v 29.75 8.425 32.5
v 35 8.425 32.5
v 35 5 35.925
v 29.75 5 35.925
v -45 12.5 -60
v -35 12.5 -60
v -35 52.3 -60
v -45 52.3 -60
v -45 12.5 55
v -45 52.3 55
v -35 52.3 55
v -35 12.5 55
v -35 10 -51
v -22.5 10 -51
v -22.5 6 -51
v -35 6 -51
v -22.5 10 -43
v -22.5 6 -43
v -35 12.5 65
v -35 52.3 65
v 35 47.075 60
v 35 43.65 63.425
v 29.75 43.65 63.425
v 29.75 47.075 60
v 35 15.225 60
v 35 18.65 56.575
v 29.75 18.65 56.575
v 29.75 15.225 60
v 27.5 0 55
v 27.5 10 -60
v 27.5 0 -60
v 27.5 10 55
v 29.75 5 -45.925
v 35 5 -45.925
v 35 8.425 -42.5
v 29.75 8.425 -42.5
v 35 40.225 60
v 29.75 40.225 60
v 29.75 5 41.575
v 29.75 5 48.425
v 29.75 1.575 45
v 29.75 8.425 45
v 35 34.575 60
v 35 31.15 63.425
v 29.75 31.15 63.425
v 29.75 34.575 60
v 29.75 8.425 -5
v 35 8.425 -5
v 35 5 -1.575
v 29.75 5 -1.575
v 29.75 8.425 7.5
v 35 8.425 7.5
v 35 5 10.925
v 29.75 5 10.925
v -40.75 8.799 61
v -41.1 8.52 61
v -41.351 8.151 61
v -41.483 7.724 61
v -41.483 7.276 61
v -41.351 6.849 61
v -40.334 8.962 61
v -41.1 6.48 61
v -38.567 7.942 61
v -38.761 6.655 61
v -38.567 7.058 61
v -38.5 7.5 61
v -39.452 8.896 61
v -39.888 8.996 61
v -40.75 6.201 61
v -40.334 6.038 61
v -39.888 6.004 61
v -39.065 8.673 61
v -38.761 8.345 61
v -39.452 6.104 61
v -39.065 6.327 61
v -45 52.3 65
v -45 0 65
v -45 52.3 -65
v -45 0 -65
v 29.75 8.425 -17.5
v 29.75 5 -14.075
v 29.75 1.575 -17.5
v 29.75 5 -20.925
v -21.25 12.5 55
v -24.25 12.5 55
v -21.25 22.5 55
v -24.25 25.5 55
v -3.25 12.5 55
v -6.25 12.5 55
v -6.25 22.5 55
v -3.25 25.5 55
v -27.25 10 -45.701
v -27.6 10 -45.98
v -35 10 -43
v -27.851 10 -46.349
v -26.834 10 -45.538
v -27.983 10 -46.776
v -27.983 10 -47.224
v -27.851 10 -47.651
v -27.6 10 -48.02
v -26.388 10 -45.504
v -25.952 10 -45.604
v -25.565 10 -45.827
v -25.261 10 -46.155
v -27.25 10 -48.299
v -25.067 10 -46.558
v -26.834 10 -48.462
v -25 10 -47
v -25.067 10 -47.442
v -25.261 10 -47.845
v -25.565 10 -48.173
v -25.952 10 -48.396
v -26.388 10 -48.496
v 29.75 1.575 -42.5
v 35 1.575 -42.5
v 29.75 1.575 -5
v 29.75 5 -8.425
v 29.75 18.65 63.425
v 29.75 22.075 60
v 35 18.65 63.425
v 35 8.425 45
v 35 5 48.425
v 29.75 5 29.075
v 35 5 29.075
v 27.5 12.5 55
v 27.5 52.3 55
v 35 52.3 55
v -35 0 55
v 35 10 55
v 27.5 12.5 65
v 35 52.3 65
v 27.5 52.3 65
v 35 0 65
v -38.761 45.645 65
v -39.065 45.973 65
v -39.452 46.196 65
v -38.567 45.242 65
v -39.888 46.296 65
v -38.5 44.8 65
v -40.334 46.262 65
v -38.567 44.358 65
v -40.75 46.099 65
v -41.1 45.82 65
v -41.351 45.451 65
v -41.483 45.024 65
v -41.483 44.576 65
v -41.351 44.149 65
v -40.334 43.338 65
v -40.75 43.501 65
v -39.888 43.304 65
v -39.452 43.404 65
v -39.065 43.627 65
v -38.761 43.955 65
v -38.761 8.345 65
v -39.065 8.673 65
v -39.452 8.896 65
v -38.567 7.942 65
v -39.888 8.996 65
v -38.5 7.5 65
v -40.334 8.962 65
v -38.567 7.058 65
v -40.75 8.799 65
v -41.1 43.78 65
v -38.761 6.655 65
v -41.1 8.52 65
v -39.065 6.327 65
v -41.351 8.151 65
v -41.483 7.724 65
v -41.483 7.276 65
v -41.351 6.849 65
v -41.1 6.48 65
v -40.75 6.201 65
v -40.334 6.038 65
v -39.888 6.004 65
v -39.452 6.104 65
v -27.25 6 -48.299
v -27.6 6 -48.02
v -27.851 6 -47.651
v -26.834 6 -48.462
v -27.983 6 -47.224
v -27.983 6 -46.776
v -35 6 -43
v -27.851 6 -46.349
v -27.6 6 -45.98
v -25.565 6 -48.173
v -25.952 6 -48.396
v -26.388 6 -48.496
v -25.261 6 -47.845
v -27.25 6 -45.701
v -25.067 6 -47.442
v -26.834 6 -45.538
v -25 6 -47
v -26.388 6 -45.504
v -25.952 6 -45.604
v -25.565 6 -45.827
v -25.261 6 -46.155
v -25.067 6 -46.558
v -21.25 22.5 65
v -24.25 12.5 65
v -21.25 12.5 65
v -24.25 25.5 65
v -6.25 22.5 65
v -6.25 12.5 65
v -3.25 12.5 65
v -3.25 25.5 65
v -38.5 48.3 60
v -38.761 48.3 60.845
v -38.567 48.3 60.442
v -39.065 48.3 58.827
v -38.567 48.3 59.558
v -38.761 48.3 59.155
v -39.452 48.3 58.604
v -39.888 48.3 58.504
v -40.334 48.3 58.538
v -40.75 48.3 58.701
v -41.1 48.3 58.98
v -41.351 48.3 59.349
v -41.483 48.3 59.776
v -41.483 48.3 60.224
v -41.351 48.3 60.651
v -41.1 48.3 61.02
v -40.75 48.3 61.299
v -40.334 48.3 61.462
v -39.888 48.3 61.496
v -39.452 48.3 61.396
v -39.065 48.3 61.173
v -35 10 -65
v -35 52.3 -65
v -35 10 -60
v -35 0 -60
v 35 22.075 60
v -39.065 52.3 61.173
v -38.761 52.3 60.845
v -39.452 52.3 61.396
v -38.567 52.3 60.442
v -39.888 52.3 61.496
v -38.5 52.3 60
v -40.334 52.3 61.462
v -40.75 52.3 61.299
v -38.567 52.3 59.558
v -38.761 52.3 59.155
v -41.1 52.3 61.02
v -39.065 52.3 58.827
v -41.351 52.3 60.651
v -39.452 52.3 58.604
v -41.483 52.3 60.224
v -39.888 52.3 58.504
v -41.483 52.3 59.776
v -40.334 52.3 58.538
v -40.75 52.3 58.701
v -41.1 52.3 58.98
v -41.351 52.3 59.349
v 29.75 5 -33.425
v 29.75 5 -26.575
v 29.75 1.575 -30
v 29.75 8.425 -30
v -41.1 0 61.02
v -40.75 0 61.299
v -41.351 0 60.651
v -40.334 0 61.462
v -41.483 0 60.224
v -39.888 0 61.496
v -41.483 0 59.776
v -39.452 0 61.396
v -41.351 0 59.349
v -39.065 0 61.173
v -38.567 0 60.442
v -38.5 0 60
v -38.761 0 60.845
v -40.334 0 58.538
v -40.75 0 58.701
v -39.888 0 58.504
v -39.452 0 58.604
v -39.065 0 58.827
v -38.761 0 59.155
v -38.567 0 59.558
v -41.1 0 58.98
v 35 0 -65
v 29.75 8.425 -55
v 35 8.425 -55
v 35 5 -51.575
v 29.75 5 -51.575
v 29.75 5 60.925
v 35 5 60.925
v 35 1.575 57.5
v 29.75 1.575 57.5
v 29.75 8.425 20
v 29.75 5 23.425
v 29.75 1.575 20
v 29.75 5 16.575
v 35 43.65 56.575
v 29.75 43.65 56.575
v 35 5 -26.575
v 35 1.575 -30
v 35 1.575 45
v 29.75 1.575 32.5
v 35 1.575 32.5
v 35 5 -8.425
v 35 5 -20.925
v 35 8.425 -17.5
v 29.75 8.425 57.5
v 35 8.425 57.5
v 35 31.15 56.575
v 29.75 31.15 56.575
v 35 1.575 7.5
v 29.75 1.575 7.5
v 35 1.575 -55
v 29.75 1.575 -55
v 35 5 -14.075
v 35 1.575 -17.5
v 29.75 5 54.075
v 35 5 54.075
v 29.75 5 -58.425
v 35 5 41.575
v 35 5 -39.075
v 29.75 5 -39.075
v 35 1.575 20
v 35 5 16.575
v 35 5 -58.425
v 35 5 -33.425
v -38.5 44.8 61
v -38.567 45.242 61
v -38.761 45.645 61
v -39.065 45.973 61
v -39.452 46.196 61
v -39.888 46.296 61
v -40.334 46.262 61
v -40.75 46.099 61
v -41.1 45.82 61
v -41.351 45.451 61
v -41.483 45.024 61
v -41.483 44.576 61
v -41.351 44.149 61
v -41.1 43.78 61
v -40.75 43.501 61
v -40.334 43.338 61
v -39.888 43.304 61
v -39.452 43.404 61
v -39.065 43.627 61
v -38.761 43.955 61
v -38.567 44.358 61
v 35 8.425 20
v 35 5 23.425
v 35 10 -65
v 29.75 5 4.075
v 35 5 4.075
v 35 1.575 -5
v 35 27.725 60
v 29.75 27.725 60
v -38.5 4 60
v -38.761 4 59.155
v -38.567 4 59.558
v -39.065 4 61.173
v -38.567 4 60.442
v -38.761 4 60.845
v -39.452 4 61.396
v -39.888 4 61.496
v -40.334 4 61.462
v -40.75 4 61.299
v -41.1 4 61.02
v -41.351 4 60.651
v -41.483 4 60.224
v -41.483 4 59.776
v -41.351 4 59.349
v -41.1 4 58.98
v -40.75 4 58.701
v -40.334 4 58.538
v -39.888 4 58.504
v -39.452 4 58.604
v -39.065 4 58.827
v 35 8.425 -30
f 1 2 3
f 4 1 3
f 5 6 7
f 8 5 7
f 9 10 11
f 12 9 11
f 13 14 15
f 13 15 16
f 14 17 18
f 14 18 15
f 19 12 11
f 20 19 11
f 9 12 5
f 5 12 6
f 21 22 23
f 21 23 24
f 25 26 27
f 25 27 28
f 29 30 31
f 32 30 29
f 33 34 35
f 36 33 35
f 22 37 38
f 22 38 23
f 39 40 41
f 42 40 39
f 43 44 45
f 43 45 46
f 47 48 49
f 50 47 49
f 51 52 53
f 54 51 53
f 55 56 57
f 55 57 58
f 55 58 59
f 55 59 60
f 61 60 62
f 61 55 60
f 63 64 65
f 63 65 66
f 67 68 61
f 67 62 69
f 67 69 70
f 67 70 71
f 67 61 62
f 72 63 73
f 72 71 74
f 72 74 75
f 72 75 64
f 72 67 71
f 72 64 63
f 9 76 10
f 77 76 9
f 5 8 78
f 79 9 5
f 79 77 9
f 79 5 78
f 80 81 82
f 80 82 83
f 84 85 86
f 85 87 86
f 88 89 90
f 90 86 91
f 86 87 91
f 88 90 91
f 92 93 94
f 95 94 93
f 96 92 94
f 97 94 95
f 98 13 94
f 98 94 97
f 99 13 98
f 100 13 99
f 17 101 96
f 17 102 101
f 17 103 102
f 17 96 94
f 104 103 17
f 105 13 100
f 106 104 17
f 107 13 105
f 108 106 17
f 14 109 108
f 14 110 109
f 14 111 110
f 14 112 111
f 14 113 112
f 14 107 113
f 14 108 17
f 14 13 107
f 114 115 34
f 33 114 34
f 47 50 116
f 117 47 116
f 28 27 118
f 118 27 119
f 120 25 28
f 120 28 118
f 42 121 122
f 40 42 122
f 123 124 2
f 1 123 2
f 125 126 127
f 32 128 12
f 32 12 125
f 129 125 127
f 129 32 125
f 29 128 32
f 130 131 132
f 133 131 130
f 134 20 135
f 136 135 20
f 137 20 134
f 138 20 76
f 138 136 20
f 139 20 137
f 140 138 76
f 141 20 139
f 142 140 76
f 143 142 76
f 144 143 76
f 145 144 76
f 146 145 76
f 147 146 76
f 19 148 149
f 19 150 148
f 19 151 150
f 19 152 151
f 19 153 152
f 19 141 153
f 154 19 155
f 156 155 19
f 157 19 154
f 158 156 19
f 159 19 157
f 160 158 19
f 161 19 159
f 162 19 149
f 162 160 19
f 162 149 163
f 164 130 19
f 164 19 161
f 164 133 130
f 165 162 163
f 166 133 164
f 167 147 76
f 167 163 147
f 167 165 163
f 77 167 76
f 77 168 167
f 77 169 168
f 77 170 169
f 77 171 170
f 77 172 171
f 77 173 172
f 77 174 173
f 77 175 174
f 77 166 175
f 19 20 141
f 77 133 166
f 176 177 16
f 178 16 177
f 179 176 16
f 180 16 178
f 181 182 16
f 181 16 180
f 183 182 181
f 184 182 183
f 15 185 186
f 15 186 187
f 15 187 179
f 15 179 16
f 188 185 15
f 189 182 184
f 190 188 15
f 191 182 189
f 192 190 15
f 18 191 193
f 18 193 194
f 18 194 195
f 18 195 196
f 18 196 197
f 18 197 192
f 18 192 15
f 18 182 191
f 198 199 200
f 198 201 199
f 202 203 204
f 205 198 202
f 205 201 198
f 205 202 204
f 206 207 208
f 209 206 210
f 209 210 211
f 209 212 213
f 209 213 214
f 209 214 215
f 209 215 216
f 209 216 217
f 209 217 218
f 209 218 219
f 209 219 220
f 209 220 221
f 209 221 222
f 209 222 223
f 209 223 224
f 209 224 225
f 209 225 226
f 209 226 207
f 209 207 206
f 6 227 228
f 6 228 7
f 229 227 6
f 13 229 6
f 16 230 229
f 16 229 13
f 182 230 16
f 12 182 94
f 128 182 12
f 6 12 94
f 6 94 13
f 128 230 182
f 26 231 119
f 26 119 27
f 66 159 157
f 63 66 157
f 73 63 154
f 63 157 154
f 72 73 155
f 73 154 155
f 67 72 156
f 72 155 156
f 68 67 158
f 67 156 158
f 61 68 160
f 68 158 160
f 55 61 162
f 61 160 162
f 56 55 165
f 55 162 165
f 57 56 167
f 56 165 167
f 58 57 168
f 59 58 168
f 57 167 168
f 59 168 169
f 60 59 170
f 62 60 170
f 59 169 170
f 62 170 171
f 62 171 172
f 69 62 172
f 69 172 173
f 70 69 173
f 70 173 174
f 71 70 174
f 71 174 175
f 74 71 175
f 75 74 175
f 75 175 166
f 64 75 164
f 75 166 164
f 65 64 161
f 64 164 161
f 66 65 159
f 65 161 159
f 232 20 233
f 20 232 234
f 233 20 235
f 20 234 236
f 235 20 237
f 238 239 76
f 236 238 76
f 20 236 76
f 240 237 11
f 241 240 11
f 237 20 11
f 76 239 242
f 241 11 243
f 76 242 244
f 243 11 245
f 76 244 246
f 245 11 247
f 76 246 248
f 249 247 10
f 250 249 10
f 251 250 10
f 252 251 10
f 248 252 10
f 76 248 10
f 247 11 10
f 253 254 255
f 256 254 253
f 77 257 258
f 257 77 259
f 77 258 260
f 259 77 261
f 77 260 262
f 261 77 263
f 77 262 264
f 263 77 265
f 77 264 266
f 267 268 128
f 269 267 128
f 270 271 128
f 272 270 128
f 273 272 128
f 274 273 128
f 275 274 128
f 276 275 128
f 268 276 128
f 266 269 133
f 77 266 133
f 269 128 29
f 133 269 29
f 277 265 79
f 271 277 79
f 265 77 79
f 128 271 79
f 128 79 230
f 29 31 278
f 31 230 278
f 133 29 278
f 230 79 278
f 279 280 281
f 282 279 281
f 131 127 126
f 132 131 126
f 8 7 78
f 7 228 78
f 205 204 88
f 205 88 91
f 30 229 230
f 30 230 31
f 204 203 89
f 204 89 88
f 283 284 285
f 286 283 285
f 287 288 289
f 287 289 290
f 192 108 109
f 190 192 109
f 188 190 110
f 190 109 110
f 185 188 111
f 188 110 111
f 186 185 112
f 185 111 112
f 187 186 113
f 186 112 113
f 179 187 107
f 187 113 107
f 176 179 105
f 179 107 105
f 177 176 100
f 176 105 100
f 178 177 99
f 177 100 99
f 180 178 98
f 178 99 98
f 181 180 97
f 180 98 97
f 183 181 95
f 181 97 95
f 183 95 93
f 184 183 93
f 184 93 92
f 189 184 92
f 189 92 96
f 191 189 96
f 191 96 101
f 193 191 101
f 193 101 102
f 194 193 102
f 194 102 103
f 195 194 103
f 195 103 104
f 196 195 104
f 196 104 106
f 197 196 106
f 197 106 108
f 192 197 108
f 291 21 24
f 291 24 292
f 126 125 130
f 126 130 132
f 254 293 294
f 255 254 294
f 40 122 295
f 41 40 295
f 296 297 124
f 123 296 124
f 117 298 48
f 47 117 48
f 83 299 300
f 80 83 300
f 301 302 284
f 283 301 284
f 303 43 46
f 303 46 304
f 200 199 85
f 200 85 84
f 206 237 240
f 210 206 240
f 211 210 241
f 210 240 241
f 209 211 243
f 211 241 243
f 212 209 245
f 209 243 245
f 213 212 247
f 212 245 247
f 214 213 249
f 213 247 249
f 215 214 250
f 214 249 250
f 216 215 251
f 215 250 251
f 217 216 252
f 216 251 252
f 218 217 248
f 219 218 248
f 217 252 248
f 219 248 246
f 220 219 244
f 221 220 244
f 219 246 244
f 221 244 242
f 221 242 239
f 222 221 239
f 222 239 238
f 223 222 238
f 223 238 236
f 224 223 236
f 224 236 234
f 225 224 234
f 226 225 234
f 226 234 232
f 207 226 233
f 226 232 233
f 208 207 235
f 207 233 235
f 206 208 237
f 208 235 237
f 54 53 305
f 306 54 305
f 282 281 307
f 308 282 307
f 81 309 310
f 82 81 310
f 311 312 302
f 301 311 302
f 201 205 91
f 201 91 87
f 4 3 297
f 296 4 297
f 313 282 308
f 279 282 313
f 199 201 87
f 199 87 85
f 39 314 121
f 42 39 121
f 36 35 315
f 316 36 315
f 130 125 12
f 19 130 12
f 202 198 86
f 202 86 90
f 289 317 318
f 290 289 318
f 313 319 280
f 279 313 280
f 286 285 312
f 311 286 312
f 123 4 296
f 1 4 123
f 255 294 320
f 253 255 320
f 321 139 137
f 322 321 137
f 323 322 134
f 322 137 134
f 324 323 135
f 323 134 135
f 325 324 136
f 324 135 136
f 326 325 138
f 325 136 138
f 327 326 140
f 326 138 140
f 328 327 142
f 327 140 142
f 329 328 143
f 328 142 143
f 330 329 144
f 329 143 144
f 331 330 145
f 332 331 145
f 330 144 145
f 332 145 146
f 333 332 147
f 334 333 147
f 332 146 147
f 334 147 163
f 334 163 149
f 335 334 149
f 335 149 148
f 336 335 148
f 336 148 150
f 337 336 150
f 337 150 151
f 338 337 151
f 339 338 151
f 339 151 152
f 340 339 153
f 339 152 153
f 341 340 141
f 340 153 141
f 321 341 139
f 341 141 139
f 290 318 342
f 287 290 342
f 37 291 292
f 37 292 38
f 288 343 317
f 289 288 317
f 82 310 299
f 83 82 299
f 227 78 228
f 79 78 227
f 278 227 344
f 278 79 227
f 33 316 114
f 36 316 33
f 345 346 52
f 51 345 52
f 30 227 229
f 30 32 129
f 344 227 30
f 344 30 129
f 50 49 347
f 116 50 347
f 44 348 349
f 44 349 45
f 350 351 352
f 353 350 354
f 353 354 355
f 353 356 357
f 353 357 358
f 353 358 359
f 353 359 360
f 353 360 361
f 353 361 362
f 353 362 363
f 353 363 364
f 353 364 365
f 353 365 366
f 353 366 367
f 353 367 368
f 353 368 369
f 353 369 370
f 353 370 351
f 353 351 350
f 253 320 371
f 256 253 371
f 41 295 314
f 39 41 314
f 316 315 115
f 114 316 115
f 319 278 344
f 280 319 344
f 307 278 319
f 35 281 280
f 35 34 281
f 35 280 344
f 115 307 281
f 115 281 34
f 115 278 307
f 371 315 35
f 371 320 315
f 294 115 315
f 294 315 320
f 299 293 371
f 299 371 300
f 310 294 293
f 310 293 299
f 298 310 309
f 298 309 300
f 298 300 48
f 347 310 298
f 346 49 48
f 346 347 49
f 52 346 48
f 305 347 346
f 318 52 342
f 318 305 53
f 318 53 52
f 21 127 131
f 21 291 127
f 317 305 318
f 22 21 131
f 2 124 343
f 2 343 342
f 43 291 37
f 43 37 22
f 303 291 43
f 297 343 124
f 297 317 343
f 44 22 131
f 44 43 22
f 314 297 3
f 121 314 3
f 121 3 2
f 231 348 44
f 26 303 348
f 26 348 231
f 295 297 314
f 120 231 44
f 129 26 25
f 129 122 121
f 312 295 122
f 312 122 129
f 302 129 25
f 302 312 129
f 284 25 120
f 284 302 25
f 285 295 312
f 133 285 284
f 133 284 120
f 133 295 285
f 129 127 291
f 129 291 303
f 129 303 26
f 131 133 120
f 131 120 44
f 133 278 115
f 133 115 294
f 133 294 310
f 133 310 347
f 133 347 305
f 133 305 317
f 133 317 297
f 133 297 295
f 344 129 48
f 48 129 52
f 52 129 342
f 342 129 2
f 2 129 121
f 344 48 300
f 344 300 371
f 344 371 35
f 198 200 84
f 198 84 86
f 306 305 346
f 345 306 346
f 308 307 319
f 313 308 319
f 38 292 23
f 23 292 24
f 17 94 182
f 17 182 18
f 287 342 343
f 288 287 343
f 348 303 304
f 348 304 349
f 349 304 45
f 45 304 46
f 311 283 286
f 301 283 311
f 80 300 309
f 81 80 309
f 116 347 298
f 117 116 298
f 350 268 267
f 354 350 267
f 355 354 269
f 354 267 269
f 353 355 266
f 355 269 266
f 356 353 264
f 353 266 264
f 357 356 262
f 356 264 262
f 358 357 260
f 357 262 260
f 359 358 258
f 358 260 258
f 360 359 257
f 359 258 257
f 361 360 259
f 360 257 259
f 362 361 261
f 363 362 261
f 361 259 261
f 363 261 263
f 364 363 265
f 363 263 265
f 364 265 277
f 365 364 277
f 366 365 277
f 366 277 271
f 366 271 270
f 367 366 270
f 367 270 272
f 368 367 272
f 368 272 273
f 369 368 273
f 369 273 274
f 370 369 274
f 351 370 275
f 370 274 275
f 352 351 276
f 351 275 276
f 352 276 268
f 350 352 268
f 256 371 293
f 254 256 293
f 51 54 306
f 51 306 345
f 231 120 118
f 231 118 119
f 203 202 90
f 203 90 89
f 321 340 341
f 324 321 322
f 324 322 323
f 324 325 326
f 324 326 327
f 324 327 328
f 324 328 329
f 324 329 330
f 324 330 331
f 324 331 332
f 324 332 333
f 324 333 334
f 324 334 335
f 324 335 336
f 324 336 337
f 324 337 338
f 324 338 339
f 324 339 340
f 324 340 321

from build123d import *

# Parameters (mm, degrees)
SKETCH1_W           = 80
SKETCH1_H           = 130
BOSS_EXTRUDE1_DEPTH = 10
BOSS_EXTRUDE2_DEPTH = 42.3
CUT_EXTRUDE1_DEPTH  = 5.25
SKETCH4_R           = 1.5
CUT_EXTRUDE2_DEPTH  = 11
CUT_EXTRUDE3_DEPTH  = 11
SKETCH7_W           = 115
SKETCH7_H           = 39.8
CUT_EXTRUDE4_DEPTH  = 11
SKETCH8_W           = 62.5
SKETCH8_H           = 39.8
CUT_EXTRUDE5_DEPTH  = 10
SKETCH9_R           = 1.5
CUT_EXTRUDE6_DEPTH  = 4
SKETCH10_R          = 1.5
CUT_EXTRUDE7_DEPTH  = 4
SKETCH11_W          = 12.5
SKETCH11_H          = 8
CUT_EXTRUDE8_DEPTH  = 6
BOSS_EXTRUDE3_DEPTH = 10
SKETCH14_R          = 1.5
CUT_EXTRUDE9_DEPTH  = 4


with BuildPart() as part:
    # Sketch1 → Boss-Extrude1 (new body)
    with BuildSketch(Plane(origin=(0, 0, 0), x_dir=(1, 0, 0), z_dir=(0, 1, 0))):
        with Locations((-5, 0)):
            Rectangle(SKETCH1_W, SKETCH1_H)
    extrude(amount=BOSS_EXTRUDE1_DEPTH)

    # Sketch2 → Boss-Extrude2 (add)
    with BuildSketch(Plane(origin=(0, 10, 0), x_dir=(1, 0, 0), z_dir=(0, 1, 0))):
        Polygon((35, -65), (-45, -65), (-45, 65), (-35, 65), (-35, -55), (35, -55), align=None)
    extrude(amount=BOSS_EXTRUDE2_DEPTH)

    # Sketch3 → Cut-Extrude1 (cut)
    with BuildSketch(Plane(origin=(35, 0, 0), x_dir=(0, 0, -1), z_dir=(1, 0, 0))):
        Polygon((20.925, 5), (17.5, 8.425), (14.075, 5), (17.5, 1.575), align=None)
        Polygon((33.425, 5), (30, 8.425), (26.575, 5), (30, 1.575), align=None)
        Polygon((5, 8.425), (1.575, 5), (5, 1.575), (8.425, 5), align=None)
        Polygon((-4.075, 5), (-7.5, 8.425), (-10.925, 5), (-7.5, 1.575), align=None)
        Polygon((-16.575, 5), (-20, 8.425), (-23.425, 5), (-20, 1.575), align=None)
        Polygon((-29.075, 5), (-32.5, 8.425), (-35.925, 5), (-32.5, 1.575), align=None)
        Polygon((-41.575, 5), (-45, 8.425), (-48.425, 5), (-45, 1.575), align=None)
        Polygon((-54.075, 5), (-57.5, 8.425), (-60.925, 5), (-57.5, 1.575), align=None)
        Polygon((-63.425, 31.15), (-60, 34.575), (-56.575, 31.15), (-60, 27.725), align=None)
        Polygon((-60, 40.225), (-63.425, 43.65), (-60, 47.075), (-56.575, 43.65), align=None)
        Polygon((-60, 15.225), (-63.425, 18.65), (-60, 22.075), (-56.575, 18.65), align=None)
        Polygon((45.925, 5), (42.5, 8.425), (39.075, 5), (42.5, 1.575), align=None)
        Polygon((58.425, 5), (55, 8.425), (51.575, 5), (55, 1.575), align=None)
    extrude(amount=-CUT_EXTRUDE1_DEPTH, mode=Mode.SUBTRACT)

    # Sketch4 → Cut-Extrude2 (cut, through all)
    with BuildSketch(Plane(origin=(0, 10, 0), x_dir=(1, 0, 0), z_dir=(0, 1, 0))):
        with Locations((-26.5, 47)):
            Circle(SKETCH4_R)
    extrude(amount=-CUT_EXTRUDE2_DEPTH, mode=Mode.SUBTRACT)

    # Sketch5 → Cut-Extrude3 (cut, through all)
    with BuildSketch(Plane(origin=(0, 10, 0), x_dir=(1, 0, 0), z_dir=(0, 1, 0))):
        Polygon((-35, -55), (-35, 43), (-22.5, 43), (-22.5, 51), (-35, 51), (-35, 60), (27.5, 60), (27.5, -55), align=None)
    extrude(amount=-CUT_EXTRUDE3_DEPTH, mode=Mode.SUBTRACT)

    # Sketch7 → Cut-Extrude4 (cut, through all)
    with BuildSketch(Plane(origin=(-35, 0, 0), x_dir=(0, 0, -1), z_dir=(1, 0, 0))):
        with Locations((2.5, 32.4)):
            Rectangle(SKETCH7_W, SKETCH7_H)
    extrude(amount=-CUT_EXTRUDE4_DEPTH, mode=Mode.SUBTRACT)

    # Sketch8 → Cut-Extrude5 (cut)
    with BuildSketch(Plane(origin=(0, 0, 55), x_dir=(-1, 0, 0), z_dir=(0, 0, -1))):
        with Locations((3.75, 32.4)):
            Rectangle(SKETCH8_W, SKETCH8_H)
    extrude(amount=-CUT_EXTRUDE5_DEPTH, mode=Mode.SUBTRACT)

    # Sketch9 → Cut-Extrude6 (cut)
    with BuildSketch(Plane(origin=(0, 52.3, 0), x_dir=(1, 0, 0), z_dir=(0, 1, 0))):
        with Locations((-40, -60)):
            Circle(SKETCH9_R)
    extrude(amount=-CUT_EXTRUDE6_DEPTH, mode=Mode.SUBTRACT)

    # Sketch10 → Cut-Extrude7 (cut)
    with BuildSketch(Plane.XZ):
        with Locations((-40, 60)):
            Circle(SKETCH10_R)
    extrude(amount=-CUT_EXTRUDE7_DEPTH, mode=Mode.SUBTRACT)

    # Sketch11 → Cut-Extrude8 (cut)
    with BuildSketch(Plane.XZ):
        with Locations((-28.75, -47)):
            Rectangle(SKETCH11_W, SKETCH11_H)
    extrude(amount=-CUT_EXTRUDE8_DEPTH, mode=Mode.SUBTRACT)

    # Sketch14 → Cut-Extrude9 (cut)
    with BuildSketch(Plane.XY.offset(65)):
        with Locations((-40, 44.8)):
            Circle(SKETCH14_R)
        with Locations((-40, 7.5)):
            Circle(SKETCH14_R)
    extrude(amount=-CUT_EXTRUDE9_DEPTH, mode=Mode.SUBTRACT)


with BuildPart() as body_2:
    # Sketch13 → Boss-Extrude3 (new body)
    with BuildSketch(Plane.XY.offset(65)):
        Polygon((-24.25, 12.5), (-21.25, 12.5), (-21.25, 22.5), (-6.25, 22.5), (-6.25, 12.5), (-3.25, 12.5), (-3.25, 25.5), (-24.25, 25.5), align=None)
    extrude(amount=-BOSS_EXTRUDE3_DEPTH)


solid = Compound([part.part, body_2.part])
